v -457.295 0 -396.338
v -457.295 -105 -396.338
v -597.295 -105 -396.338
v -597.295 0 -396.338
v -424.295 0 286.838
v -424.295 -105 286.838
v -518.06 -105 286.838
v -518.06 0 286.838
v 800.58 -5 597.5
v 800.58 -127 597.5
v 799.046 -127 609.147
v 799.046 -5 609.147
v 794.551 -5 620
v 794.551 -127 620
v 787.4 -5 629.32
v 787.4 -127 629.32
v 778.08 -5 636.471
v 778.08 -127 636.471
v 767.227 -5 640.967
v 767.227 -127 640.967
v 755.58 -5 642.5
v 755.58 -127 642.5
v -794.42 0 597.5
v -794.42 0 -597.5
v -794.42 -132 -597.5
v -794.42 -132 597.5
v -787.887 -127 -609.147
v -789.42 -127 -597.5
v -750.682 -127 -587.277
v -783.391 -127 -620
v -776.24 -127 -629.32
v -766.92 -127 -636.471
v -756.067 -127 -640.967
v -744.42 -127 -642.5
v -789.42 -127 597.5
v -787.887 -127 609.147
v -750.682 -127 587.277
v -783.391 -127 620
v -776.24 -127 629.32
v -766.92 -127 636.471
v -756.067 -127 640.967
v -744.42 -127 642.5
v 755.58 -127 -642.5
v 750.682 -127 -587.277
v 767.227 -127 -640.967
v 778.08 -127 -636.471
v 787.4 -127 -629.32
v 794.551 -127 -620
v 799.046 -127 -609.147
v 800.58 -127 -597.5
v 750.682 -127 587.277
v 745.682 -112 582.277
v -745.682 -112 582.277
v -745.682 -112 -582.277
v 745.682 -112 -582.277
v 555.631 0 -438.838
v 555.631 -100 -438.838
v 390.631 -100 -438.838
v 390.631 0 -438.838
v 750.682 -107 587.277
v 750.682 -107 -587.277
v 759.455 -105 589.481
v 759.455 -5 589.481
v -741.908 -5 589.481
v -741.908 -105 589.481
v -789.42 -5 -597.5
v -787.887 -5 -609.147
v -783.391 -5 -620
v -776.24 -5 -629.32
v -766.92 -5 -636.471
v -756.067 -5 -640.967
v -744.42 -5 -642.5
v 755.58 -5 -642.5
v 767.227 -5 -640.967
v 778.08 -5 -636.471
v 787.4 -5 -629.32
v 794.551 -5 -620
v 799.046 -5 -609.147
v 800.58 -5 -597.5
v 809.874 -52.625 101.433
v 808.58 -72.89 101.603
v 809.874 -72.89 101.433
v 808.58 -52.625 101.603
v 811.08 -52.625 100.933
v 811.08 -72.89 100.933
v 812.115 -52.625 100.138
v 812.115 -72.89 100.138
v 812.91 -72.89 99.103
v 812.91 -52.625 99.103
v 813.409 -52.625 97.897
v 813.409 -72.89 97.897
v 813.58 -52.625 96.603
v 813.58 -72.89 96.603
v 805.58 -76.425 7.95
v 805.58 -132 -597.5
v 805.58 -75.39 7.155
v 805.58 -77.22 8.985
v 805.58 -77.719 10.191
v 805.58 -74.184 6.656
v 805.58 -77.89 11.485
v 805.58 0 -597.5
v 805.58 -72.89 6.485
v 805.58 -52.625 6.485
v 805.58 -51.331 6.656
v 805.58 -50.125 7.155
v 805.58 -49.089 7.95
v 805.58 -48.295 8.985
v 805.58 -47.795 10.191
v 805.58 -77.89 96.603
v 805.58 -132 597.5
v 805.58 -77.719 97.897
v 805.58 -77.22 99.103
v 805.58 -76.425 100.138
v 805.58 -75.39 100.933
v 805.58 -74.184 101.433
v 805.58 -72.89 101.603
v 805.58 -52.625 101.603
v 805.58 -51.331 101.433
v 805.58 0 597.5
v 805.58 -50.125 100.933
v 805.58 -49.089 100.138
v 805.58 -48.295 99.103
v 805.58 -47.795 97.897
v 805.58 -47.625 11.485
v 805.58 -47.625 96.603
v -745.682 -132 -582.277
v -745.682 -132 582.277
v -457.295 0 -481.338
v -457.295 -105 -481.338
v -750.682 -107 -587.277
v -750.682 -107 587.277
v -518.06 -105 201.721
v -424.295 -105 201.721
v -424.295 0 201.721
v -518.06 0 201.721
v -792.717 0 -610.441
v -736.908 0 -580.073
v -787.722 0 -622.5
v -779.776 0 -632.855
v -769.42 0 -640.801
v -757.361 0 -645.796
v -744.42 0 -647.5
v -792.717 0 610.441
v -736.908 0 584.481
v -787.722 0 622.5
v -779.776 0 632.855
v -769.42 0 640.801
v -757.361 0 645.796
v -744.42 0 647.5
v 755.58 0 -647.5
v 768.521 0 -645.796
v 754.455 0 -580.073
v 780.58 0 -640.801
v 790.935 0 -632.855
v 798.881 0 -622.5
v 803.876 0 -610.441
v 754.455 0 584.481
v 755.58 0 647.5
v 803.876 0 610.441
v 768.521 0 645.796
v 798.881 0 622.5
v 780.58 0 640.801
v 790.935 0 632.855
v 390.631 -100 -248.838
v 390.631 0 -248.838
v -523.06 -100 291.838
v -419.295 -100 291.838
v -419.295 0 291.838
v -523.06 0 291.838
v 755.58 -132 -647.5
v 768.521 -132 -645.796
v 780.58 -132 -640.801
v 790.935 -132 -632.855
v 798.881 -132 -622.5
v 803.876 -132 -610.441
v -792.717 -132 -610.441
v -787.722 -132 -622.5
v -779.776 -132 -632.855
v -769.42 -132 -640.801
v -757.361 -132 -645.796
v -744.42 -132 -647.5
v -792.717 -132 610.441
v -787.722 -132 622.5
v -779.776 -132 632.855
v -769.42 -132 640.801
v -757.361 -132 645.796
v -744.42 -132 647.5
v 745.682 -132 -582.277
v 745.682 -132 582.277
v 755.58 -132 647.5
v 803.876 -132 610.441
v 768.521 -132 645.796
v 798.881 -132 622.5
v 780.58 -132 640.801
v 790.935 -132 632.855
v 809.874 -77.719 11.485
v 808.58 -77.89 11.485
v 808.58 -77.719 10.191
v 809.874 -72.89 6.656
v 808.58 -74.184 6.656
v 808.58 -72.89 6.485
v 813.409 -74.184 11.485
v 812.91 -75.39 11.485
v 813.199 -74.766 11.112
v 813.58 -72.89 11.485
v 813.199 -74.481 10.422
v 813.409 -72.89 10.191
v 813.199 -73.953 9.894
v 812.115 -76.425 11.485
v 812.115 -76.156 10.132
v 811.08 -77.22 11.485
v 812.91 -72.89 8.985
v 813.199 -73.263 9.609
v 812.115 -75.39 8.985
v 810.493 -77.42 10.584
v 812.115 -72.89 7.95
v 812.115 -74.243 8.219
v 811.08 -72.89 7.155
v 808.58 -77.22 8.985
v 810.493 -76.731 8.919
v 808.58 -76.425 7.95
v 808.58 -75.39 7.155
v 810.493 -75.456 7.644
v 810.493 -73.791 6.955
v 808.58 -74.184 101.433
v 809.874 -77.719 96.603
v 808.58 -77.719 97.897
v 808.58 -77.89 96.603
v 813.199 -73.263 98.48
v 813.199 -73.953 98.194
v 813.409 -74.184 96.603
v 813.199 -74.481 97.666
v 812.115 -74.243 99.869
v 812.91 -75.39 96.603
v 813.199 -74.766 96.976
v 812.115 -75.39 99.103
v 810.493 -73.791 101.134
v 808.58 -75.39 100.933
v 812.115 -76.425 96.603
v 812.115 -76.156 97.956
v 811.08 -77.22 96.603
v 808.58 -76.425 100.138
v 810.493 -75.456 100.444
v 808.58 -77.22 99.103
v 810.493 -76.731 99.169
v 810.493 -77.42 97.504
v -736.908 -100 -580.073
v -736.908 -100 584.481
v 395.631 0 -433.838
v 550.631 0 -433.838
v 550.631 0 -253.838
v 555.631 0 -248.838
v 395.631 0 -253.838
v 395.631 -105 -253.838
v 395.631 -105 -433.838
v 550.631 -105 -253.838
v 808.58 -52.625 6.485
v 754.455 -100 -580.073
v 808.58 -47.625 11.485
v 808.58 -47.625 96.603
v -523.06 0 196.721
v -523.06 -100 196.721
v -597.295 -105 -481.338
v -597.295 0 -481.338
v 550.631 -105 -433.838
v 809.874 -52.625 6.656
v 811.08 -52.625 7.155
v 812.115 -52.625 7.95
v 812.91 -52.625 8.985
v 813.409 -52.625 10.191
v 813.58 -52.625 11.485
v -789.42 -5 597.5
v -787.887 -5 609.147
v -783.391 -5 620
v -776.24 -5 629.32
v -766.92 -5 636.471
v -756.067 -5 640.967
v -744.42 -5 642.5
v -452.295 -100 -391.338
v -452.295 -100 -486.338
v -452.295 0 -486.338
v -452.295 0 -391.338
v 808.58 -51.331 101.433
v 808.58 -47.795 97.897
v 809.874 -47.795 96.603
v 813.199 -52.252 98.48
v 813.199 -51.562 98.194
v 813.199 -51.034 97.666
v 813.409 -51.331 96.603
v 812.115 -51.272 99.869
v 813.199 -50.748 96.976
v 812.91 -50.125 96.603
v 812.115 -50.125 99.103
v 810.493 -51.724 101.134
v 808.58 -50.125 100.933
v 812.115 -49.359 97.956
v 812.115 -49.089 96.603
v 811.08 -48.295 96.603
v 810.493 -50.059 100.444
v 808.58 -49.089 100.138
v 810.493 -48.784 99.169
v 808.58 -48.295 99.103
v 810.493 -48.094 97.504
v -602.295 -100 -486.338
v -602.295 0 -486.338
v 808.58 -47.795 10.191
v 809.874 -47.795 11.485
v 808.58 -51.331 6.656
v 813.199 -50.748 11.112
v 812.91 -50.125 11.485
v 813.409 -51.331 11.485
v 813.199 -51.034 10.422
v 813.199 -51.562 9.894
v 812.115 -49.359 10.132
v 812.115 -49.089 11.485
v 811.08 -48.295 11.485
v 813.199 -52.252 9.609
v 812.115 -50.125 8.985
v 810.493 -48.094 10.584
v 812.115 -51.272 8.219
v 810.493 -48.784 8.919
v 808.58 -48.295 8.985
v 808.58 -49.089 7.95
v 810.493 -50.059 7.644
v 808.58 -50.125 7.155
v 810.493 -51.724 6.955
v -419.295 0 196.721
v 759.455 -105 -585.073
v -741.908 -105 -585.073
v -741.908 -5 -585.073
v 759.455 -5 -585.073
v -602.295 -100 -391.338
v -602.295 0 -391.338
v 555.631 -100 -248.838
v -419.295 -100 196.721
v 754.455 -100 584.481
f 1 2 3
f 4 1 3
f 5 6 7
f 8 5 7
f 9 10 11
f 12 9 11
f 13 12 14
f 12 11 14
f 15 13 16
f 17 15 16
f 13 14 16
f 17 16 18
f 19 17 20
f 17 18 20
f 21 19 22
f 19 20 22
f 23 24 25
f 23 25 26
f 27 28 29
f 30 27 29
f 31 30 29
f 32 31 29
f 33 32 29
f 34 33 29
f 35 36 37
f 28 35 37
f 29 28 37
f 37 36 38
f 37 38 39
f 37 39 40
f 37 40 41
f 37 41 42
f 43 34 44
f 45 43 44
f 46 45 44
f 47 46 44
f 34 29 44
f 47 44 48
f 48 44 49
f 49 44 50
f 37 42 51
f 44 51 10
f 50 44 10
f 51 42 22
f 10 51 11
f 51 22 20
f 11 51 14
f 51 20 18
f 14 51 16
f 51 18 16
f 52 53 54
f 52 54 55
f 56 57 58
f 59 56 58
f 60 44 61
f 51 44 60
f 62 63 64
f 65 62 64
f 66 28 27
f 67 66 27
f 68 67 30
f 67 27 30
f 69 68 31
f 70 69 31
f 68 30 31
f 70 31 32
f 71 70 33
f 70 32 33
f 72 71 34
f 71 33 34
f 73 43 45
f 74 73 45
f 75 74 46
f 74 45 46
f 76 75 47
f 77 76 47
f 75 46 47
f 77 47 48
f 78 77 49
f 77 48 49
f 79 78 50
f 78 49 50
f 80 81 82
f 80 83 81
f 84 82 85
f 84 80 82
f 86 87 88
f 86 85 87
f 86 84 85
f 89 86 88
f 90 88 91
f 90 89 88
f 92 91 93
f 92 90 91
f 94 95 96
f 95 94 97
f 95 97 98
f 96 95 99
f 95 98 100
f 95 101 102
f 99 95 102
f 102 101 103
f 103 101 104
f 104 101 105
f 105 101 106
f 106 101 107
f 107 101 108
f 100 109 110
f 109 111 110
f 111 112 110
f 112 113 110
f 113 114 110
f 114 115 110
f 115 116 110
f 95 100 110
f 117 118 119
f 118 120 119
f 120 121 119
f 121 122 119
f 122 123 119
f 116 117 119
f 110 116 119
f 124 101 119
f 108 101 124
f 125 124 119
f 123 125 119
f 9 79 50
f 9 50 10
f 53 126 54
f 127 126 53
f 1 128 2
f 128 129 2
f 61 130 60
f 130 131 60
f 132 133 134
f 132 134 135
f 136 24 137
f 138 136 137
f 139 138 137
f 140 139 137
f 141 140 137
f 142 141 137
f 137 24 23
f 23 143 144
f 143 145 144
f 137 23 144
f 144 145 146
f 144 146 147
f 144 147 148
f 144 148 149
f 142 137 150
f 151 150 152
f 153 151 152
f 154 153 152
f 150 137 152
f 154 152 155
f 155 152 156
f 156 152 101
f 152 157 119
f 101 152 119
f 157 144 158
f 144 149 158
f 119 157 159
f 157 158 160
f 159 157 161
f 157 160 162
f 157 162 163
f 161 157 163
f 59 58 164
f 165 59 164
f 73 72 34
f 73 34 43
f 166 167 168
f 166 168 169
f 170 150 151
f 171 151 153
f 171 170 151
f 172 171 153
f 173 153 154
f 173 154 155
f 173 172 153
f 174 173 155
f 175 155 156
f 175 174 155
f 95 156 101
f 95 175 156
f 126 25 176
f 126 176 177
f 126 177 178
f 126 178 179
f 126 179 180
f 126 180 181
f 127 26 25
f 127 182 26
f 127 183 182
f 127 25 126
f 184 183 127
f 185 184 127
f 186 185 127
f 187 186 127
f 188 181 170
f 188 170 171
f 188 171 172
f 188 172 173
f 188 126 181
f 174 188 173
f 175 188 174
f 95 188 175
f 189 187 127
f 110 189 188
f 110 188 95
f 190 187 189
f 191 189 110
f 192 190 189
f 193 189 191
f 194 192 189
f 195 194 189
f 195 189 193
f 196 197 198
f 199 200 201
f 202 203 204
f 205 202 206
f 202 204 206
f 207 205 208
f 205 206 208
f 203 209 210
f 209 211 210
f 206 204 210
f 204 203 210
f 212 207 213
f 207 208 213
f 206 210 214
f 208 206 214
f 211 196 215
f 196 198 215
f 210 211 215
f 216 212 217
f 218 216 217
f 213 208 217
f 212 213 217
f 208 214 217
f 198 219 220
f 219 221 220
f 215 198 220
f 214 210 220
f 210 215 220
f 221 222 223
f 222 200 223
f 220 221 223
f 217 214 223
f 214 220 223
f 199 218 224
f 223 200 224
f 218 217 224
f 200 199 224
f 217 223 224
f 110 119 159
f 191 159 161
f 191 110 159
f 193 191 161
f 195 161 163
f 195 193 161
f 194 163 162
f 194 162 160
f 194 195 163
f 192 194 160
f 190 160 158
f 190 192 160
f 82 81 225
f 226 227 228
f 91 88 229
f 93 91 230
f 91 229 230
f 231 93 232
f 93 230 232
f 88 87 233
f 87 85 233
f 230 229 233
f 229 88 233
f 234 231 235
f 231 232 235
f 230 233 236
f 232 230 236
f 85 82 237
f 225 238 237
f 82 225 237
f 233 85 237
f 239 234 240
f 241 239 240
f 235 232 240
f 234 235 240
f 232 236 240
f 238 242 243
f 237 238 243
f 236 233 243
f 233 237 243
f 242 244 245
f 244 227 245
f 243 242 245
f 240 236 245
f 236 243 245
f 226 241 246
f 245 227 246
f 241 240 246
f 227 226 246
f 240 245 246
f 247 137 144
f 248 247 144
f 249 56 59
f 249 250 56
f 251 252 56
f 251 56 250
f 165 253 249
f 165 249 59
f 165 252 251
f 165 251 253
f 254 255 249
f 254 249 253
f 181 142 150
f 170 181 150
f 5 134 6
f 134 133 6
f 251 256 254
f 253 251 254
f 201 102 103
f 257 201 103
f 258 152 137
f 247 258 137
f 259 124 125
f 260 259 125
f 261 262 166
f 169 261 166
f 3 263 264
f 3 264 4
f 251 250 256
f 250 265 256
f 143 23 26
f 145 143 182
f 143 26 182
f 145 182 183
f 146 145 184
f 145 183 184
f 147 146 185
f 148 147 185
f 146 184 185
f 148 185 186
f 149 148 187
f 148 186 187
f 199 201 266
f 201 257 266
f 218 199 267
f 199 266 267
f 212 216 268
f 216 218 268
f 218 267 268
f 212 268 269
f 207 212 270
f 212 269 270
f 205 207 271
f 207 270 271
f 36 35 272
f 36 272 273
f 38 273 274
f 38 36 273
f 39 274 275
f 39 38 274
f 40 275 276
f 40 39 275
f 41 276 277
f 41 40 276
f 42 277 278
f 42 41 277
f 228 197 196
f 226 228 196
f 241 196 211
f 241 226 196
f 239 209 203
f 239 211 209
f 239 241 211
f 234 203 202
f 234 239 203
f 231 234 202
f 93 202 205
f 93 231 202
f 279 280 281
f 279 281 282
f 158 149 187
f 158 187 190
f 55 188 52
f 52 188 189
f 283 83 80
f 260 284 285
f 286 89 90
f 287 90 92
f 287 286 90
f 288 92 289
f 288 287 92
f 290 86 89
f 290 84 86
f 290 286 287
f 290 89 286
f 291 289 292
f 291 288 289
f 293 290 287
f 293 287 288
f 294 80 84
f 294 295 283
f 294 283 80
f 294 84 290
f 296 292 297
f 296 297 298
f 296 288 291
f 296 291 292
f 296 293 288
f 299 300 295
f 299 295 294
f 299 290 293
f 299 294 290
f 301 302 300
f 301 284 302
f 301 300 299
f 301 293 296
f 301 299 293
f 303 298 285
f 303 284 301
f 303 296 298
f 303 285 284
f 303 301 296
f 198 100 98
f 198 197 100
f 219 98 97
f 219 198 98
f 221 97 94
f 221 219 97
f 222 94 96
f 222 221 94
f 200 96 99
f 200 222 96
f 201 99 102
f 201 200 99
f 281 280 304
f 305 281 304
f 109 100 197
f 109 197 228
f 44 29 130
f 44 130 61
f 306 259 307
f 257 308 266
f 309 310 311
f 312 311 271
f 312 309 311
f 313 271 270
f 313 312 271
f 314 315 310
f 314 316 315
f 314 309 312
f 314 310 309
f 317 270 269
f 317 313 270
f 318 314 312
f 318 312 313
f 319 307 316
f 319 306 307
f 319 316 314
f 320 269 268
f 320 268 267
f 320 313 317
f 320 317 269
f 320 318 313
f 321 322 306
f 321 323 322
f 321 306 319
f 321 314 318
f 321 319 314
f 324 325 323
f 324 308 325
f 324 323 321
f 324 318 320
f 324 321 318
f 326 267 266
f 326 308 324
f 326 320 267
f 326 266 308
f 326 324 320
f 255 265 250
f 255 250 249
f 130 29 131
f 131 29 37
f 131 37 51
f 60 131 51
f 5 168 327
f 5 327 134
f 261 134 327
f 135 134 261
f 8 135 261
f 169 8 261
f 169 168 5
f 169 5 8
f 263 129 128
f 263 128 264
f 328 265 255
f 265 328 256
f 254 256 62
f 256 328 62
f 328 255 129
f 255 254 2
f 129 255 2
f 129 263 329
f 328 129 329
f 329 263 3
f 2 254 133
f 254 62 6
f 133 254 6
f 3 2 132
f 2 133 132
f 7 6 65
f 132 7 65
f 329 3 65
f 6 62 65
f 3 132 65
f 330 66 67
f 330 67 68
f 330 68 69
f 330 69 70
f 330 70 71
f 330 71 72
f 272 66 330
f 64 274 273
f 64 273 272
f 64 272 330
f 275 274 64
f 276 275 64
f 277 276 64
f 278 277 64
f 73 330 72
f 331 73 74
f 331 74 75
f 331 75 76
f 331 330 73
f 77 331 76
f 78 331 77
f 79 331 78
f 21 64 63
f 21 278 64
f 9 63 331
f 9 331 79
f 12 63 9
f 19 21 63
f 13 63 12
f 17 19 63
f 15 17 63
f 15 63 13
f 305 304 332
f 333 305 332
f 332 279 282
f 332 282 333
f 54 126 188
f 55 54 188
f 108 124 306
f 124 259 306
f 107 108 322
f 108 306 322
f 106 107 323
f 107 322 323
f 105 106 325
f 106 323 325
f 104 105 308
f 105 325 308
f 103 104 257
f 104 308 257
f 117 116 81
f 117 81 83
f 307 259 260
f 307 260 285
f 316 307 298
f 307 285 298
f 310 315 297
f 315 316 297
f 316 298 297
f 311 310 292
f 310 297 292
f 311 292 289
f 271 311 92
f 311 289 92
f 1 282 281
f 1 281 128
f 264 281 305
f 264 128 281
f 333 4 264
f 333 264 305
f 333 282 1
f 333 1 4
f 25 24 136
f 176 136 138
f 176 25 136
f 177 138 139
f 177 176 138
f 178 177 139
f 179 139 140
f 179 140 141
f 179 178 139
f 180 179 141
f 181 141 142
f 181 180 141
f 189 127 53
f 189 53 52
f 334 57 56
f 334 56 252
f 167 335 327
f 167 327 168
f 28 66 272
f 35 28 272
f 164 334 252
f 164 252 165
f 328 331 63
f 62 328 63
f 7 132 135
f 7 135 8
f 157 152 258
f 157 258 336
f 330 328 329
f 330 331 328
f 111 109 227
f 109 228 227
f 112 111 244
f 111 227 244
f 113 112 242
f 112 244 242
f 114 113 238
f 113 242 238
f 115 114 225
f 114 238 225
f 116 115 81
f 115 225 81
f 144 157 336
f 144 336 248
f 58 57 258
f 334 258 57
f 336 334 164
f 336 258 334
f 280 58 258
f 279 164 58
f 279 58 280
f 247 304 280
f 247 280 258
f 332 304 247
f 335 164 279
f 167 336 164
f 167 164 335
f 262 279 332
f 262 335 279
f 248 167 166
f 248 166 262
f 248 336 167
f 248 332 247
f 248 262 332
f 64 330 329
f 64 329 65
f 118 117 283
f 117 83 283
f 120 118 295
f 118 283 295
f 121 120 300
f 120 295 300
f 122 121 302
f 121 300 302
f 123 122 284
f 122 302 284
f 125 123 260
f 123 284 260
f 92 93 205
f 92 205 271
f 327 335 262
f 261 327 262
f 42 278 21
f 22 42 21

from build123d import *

# Parameters (mm, degrees)
F0_W      = 1600
F0_H      = 1295
F1_DEPTH  = 132
F2_R      = 50
F4_W      = 1491.3636445999
F4_H      = 1164.5535230637
F5_DEPTH  = 20
F7_W      = 1491.3636445999
F7_H      = 1164.5535230637
F8_DEPTH  = 100
F10_W     = 150
F10_H     = 95
F10_W_2   = 103.7647128105
F10_H_2   = 95.1176285744
F10_W_3   = 165
F10_H_3   = 190
F11_DEPTH = 100
F12_T     = -5
F13_W     = 30.2646905184
F13_H     = 95.1176509261
F14_DEPTH = 8
F15_R     = 5


# Not quite as in the source:
# - the program builds the solid bodies; features that only make, move or delete a surface that nothing else refers to are left out


with BuildPart() as f1:
    # F0 (on Front) → F1 (new body)
    with BuildSketch(Plane.XZ):
        with Locations((5.5797146633, 0)):
            Rectangle(F0_W, F0_H)
    extrude(amount=F1_DEPTH)

    # F2
    f2_edges = [f1.edges().sort_by_distance(p)[0] for p in [
        (-794.420285, -66, 647.5),
        (805.579715, -66, 647.5),
        (805.579715, -66, -647.5),
        (-794.420285, -66, -647.5),
    ]]
    fillet(f2_edges, radius=F2_R)

    # F4 (on offset) → F5 (cut)
    with BuildSketch(Plane.XZ.offset(132)):
        Rectangle(F4_W, F4_H)
    extrude(amount=-F5_DEPTH, mode=Mode.SUBTRACT)

    # F7 (on offset) → F8 (cut)
    with BuildSketch(Plane(origin=(0, 0, 0), x_dir=(-1, 0, 0), z_dir=(0, 1, 0))):
        with Locations((-8.7735056877, 2.2042393684)):
            Rectangle(F7_W, F7_H)
    extrude(amount=-F8_DEPTH, mode=Mode.SUBTRACT)

    # F10 (on offset) → F11 (join)
    with BuildSketch(Plane(origin=(0, -100, 0), x_dir=(-1, 0, 0), z_dir=(0, 1, 0))):
        with Locations((527.2952914238, -438.8382136822)):
            Rectangle(F10_W, F10_H)
        with Locations((471.1775481701, 244.2793995142)):
            Rectangle(F10_W_2, F10_H_2)
        with Locations((-473.1311607361, -343.8382136822)):
            Rectangle(F10_W_3, F10_H_3)
    extrude(amount=F11_DEPTH)

    # F12
    f12_openings = [f1.faces().sort_by_distance(p)[0] for p in [
        (-527.295291, 0, -438.838214),
        (-471.177548, 0, 244.2794),
        (473.131161, 0, -343.838214),
    ]]
    offset(amount=F12_T, openings=f12_openings, kind=Kind.INTERSECTION)

    # F13 (on face) → F14 (join)
    with BuildSketch(Plane.YZ.offset(805.5797146633)):
        with Locations((-62.757357955, 54.0441162884)):
            Rectangle(F13_W, F13_H)
    extrude(amount=F14_DEPTH)

    # F15
    f15_edges = [f1.edges().sort_by_distance(p)[0] for p in [
        (809.579715, -47.625013, 101.602942),
        (809.579715, -77.889703, 101.602942),
        (809.579715, -77.889703, 6.485291),
        (809.579715, -47.625013, 6.485291),
        (813.579715, -62.757358, 101.602942),
        (813.579715, -77.889703, 54.044116),
        (813.579715, -47.625013, 54.044116),
        (813.579715, -62.757358, 6.485291),
    ]]
    fillet(f15_edges, radius=F15_R)


solid = f1.part
